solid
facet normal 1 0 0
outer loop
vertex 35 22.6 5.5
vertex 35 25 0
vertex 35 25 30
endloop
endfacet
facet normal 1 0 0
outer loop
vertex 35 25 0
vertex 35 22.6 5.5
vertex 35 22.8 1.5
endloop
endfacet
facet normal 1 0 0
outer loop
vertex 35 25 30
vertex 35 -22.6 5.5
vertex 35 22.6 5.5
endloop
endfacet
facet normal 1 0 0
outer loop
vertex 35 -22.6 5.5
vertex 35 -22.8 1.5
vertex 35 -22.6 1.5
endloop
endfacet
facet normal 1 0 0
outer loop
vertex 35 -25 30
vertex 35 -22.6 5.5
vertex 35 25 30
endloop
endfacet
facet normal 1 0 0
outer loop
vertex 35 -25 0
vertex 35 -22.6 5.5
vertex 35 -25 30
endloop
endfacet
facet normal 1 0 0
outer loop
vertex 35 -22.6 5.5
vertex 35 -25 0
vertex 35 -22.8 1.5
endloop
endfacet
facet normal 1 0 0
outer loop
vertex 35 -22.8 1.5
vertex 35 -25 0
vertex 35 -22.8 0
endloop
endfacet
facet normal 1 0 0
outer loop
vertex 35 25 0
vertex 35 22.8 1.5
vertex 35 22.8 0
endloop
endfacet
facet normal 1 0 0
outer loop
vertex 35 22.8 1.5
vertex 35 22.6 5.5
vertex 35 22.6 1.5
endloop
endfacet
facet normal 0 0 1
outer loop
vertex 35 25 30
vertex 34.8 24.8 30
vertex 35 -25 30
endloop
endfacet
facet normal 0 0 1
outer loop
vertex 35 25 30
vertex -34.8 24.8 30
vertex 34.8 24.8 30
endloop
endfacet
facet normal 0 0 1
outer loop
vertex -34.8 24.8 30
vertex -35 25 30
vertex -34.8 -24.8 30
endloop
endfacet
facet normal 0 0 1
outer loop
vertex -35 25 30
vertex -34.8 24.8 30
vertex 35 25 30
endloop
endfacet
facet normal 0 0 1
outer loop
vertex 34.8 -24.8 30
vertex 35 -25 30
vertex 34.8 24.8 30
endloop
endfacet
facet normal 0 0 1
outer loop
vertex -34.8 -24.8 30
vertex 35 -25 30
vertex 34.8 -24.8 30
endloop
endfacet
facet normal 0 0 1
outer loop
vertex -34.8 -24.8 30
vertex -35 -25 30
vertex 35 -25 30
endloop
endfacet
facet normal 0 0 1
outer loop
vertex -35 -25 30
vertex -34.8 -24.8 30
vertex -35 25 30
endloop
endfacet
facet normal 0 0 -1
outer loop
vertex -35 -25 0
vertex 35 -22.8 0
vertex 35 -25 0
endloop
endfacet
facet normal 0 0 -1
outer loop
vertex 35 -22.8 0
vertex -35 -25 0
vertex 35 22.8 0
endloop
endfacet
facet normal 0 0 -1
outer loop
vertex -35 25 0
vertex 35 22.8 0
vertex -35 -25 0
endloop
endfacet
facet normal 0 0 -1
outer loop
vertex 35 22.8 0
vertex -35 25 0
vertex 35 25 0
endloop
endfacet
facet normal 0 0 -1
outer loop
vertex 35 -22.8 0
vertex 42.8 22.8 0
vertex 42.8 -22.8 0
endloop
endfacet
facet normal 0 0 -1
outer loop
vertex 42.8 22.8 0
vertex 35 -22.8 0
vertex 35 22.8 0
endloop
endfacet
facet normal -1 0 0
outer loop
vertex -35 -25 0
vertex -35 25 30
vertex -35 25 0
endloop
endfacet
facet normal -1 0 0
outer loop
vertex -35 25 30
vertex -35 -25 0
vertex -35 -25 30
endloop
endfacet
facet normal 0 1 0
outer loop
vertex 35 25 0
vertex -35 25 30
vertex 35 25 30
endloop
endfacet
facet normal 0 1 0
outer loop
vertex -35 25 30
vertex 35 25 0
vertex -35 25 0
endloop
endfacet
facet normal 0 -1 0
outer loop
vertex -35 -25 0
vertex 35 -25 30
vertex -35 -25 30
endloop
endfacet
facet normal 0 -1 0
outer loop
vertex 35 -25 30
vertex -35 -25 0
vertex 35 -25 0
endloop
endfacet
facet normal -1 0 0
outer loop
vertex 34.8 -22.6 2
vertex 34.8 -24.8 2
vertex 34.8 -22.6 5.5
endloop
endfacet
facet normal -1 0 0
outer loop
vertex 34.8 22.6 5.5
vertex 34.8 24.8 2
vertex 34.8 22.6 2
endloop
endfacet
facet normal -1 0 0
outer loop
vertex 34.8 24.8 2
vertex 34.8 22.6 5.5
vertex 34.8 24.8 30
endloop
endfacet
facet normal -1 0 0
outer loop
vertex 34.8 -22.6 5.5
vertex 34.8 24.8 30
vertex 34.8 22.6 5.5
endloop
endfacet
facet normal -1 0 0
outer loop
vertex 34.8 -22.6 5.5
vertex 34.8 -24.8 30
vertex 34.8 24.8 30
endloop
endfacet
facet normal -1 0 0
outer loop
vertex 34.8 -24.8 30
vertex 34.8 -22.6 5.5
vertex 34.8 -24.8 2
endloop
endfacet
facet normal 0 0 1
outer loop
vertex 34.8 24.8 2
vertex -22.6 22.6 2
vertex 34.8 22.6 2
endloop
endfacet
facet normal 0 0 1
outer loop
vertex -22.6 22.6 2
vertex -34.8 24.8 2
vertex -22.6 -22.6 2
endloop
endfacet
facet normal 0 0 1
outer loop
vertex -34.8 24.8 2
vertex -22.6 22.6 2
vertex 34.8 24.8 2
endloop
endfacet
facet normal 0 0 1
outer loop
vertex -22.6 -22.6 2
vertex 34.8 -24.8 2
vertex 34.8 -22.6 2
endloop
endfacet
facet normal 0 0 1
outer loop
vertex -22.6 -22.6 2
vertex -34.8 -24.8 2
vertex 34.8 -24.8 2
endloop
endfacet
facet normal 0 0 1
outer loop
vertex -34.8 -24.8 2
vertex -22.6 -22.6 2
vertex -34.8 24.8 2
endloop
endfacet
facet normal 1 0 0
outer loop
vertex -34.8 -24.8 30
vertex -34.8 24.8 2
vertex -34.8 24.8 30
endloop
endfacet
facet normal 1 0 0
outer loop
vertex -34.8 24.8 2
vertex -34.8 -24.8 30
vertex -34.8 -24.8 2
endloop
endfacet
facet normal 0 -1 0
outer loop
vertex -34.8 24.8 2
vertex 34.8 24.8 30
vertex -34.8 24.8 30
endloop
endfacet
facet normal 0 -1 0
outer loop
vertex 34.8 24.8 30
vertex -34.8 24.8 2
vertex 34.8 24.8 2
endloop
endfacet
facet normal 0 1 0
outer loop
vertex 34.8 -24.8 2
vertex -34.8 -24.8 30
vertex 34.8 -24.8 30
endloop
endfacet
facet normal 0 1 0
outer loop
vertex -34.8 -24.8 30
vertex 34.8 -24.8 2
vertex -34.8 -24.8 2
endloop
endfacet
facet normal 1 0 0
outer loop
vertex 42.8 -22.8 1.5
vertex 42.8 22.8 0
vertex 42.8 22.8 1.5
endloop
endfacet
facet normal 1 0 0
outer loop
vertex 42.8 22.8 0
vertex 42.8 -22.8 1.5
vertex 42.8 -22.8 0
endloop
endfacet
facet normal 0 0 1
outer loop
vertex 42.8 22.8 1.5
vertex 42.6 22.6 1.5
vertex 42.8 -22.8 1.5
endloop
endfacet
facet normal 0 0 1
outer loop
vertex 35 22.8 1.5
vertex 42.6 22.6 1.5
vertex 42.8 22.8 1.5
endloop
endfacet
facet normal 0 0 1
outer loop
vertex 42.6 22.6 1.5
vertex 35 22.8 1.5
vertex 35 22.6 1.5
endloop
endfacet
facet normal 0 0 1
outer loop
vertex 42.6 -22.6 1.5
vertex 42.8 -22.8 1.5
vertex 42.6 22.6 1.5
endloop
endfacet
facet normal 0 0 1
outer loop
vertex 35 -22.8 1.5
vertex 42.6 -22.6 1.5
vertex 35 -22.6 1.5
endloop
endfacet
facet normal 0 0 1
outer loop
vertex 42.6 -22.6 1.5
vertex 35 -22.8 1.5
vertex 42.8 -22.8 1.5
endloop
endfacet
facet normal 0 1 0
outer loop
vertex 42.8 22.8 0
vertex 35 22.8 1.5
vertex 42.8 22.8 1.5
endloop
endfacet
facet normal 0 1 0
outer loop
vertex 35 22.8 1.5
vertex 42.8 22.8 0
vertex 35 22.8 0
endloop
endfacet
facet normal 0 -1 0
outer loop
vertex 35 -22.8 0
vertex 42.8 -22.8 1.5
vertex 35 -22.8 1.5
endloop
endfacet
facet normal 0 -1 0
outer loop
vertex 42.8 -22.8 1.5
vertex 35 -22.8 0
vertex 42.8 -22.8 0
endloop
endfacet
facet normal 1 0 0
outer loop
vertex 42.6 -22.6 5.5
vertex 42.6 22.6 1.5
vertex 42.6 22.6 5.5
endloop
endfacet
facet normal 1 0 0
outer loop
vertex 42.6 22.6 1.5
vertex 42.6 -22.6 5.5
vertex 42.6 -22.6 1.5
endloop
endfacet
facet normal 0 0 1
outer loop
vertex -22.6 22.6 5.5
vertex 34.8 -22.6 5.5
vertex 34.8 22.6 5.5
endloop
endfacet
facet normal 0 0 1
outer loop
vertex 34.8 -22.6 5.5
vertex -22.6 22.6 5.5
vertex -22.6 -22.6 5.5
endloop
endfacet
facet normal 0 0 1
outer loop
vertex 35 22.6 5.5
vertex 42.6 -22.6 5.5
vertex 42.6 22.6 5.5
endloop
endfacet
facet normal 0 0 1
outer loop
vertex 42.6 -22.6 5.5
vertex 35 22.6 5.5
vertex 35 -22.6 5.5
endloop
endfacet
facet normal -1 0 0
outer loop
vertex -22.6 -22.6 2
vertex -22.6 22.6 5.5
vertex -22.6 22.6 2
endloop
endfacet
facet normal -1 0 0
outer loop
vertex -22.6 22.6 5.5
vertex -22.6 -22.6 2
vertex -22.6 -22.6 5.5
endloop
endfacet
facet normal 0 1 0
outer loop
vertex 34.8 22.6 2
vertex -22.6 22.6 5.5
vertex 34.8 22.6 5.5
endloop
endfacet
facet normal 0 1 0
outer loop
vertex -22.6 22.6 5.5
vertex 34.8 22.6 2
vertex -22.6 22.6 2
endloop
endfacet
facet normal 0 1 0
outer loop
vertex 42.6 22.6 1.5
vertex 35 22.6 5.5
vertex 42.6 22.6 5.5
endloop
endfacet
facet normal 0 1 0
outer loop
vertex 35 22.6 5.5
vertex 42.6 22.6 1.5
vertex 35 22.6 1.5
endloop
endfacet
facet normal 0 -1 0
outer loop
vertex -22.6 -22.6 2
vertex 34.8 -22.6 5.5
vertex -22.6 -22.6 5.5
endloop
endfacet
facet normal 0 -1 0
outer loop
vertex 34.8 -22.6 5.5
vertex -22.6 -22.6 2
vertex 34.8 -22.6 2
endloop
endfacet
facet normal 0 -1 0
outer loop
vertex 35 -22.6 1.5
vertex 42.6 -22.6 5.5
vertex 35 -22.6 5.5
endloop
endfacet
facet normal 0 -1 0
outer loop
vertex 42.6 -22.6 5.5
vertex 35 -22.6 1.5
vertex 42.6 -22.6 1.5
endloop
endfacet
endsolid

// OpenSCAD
// Two-part enclosure for small electronics board
// Print orientation: both parts flat on bed, lid upside down

$fn = 64;

// ---- Dimensions (mm) ----
box_x      = 70;    // outer length of box
box_y      = 50;    // outer width of box
box_z      = 30;    // outer height of box
wall       = 2;     // wall thickness
floor      = 2;     // floor thickness
lip_t      = 1.5;   // lip thickness
lip_h      = 4;     // lip height
lip_x      = 65.6;  // outer lip length
lip_y      = 45.6;  // outer lip width
gap        = 10;    // gap between box and lid
clearance  = 0.2;   // clearance between lip and box opening

// ---- Derived ----
lip_d     = lip_x - 2 * clearance;  // lip inner size (X)
lip_w     = lip_y - 2 * clearance;  // lip inner size (Y)
lip_top_z = floor + box_z + lip_t;  // top of lip
overlap   = 0.01;                   // small overlap for clean union

module box() {
    difference() {
        translate([-box_x / 2, -box_y / 2, 0])
            cube([box_x, box_y, box_z]);
        translate([-box_x / 2 + clearance, -box_y / 2 + clearance, floor])
            cube([box_x - 2 * clearance, box_y - 2 * clearance, box_z - floor]);
    }
}

module lid() {
    union() {
        translate([-lip_x / 2, -lip_y / 2, 0])
            cube([lip_x, lip_y, lip_t]);
        translate([-lip_d / 2, -lip_w / 2, lip_t])
            cube([lip_d, lip_w, lip_h]);
    }
}

box();
translate([gap, 0, 0])
    lid();
